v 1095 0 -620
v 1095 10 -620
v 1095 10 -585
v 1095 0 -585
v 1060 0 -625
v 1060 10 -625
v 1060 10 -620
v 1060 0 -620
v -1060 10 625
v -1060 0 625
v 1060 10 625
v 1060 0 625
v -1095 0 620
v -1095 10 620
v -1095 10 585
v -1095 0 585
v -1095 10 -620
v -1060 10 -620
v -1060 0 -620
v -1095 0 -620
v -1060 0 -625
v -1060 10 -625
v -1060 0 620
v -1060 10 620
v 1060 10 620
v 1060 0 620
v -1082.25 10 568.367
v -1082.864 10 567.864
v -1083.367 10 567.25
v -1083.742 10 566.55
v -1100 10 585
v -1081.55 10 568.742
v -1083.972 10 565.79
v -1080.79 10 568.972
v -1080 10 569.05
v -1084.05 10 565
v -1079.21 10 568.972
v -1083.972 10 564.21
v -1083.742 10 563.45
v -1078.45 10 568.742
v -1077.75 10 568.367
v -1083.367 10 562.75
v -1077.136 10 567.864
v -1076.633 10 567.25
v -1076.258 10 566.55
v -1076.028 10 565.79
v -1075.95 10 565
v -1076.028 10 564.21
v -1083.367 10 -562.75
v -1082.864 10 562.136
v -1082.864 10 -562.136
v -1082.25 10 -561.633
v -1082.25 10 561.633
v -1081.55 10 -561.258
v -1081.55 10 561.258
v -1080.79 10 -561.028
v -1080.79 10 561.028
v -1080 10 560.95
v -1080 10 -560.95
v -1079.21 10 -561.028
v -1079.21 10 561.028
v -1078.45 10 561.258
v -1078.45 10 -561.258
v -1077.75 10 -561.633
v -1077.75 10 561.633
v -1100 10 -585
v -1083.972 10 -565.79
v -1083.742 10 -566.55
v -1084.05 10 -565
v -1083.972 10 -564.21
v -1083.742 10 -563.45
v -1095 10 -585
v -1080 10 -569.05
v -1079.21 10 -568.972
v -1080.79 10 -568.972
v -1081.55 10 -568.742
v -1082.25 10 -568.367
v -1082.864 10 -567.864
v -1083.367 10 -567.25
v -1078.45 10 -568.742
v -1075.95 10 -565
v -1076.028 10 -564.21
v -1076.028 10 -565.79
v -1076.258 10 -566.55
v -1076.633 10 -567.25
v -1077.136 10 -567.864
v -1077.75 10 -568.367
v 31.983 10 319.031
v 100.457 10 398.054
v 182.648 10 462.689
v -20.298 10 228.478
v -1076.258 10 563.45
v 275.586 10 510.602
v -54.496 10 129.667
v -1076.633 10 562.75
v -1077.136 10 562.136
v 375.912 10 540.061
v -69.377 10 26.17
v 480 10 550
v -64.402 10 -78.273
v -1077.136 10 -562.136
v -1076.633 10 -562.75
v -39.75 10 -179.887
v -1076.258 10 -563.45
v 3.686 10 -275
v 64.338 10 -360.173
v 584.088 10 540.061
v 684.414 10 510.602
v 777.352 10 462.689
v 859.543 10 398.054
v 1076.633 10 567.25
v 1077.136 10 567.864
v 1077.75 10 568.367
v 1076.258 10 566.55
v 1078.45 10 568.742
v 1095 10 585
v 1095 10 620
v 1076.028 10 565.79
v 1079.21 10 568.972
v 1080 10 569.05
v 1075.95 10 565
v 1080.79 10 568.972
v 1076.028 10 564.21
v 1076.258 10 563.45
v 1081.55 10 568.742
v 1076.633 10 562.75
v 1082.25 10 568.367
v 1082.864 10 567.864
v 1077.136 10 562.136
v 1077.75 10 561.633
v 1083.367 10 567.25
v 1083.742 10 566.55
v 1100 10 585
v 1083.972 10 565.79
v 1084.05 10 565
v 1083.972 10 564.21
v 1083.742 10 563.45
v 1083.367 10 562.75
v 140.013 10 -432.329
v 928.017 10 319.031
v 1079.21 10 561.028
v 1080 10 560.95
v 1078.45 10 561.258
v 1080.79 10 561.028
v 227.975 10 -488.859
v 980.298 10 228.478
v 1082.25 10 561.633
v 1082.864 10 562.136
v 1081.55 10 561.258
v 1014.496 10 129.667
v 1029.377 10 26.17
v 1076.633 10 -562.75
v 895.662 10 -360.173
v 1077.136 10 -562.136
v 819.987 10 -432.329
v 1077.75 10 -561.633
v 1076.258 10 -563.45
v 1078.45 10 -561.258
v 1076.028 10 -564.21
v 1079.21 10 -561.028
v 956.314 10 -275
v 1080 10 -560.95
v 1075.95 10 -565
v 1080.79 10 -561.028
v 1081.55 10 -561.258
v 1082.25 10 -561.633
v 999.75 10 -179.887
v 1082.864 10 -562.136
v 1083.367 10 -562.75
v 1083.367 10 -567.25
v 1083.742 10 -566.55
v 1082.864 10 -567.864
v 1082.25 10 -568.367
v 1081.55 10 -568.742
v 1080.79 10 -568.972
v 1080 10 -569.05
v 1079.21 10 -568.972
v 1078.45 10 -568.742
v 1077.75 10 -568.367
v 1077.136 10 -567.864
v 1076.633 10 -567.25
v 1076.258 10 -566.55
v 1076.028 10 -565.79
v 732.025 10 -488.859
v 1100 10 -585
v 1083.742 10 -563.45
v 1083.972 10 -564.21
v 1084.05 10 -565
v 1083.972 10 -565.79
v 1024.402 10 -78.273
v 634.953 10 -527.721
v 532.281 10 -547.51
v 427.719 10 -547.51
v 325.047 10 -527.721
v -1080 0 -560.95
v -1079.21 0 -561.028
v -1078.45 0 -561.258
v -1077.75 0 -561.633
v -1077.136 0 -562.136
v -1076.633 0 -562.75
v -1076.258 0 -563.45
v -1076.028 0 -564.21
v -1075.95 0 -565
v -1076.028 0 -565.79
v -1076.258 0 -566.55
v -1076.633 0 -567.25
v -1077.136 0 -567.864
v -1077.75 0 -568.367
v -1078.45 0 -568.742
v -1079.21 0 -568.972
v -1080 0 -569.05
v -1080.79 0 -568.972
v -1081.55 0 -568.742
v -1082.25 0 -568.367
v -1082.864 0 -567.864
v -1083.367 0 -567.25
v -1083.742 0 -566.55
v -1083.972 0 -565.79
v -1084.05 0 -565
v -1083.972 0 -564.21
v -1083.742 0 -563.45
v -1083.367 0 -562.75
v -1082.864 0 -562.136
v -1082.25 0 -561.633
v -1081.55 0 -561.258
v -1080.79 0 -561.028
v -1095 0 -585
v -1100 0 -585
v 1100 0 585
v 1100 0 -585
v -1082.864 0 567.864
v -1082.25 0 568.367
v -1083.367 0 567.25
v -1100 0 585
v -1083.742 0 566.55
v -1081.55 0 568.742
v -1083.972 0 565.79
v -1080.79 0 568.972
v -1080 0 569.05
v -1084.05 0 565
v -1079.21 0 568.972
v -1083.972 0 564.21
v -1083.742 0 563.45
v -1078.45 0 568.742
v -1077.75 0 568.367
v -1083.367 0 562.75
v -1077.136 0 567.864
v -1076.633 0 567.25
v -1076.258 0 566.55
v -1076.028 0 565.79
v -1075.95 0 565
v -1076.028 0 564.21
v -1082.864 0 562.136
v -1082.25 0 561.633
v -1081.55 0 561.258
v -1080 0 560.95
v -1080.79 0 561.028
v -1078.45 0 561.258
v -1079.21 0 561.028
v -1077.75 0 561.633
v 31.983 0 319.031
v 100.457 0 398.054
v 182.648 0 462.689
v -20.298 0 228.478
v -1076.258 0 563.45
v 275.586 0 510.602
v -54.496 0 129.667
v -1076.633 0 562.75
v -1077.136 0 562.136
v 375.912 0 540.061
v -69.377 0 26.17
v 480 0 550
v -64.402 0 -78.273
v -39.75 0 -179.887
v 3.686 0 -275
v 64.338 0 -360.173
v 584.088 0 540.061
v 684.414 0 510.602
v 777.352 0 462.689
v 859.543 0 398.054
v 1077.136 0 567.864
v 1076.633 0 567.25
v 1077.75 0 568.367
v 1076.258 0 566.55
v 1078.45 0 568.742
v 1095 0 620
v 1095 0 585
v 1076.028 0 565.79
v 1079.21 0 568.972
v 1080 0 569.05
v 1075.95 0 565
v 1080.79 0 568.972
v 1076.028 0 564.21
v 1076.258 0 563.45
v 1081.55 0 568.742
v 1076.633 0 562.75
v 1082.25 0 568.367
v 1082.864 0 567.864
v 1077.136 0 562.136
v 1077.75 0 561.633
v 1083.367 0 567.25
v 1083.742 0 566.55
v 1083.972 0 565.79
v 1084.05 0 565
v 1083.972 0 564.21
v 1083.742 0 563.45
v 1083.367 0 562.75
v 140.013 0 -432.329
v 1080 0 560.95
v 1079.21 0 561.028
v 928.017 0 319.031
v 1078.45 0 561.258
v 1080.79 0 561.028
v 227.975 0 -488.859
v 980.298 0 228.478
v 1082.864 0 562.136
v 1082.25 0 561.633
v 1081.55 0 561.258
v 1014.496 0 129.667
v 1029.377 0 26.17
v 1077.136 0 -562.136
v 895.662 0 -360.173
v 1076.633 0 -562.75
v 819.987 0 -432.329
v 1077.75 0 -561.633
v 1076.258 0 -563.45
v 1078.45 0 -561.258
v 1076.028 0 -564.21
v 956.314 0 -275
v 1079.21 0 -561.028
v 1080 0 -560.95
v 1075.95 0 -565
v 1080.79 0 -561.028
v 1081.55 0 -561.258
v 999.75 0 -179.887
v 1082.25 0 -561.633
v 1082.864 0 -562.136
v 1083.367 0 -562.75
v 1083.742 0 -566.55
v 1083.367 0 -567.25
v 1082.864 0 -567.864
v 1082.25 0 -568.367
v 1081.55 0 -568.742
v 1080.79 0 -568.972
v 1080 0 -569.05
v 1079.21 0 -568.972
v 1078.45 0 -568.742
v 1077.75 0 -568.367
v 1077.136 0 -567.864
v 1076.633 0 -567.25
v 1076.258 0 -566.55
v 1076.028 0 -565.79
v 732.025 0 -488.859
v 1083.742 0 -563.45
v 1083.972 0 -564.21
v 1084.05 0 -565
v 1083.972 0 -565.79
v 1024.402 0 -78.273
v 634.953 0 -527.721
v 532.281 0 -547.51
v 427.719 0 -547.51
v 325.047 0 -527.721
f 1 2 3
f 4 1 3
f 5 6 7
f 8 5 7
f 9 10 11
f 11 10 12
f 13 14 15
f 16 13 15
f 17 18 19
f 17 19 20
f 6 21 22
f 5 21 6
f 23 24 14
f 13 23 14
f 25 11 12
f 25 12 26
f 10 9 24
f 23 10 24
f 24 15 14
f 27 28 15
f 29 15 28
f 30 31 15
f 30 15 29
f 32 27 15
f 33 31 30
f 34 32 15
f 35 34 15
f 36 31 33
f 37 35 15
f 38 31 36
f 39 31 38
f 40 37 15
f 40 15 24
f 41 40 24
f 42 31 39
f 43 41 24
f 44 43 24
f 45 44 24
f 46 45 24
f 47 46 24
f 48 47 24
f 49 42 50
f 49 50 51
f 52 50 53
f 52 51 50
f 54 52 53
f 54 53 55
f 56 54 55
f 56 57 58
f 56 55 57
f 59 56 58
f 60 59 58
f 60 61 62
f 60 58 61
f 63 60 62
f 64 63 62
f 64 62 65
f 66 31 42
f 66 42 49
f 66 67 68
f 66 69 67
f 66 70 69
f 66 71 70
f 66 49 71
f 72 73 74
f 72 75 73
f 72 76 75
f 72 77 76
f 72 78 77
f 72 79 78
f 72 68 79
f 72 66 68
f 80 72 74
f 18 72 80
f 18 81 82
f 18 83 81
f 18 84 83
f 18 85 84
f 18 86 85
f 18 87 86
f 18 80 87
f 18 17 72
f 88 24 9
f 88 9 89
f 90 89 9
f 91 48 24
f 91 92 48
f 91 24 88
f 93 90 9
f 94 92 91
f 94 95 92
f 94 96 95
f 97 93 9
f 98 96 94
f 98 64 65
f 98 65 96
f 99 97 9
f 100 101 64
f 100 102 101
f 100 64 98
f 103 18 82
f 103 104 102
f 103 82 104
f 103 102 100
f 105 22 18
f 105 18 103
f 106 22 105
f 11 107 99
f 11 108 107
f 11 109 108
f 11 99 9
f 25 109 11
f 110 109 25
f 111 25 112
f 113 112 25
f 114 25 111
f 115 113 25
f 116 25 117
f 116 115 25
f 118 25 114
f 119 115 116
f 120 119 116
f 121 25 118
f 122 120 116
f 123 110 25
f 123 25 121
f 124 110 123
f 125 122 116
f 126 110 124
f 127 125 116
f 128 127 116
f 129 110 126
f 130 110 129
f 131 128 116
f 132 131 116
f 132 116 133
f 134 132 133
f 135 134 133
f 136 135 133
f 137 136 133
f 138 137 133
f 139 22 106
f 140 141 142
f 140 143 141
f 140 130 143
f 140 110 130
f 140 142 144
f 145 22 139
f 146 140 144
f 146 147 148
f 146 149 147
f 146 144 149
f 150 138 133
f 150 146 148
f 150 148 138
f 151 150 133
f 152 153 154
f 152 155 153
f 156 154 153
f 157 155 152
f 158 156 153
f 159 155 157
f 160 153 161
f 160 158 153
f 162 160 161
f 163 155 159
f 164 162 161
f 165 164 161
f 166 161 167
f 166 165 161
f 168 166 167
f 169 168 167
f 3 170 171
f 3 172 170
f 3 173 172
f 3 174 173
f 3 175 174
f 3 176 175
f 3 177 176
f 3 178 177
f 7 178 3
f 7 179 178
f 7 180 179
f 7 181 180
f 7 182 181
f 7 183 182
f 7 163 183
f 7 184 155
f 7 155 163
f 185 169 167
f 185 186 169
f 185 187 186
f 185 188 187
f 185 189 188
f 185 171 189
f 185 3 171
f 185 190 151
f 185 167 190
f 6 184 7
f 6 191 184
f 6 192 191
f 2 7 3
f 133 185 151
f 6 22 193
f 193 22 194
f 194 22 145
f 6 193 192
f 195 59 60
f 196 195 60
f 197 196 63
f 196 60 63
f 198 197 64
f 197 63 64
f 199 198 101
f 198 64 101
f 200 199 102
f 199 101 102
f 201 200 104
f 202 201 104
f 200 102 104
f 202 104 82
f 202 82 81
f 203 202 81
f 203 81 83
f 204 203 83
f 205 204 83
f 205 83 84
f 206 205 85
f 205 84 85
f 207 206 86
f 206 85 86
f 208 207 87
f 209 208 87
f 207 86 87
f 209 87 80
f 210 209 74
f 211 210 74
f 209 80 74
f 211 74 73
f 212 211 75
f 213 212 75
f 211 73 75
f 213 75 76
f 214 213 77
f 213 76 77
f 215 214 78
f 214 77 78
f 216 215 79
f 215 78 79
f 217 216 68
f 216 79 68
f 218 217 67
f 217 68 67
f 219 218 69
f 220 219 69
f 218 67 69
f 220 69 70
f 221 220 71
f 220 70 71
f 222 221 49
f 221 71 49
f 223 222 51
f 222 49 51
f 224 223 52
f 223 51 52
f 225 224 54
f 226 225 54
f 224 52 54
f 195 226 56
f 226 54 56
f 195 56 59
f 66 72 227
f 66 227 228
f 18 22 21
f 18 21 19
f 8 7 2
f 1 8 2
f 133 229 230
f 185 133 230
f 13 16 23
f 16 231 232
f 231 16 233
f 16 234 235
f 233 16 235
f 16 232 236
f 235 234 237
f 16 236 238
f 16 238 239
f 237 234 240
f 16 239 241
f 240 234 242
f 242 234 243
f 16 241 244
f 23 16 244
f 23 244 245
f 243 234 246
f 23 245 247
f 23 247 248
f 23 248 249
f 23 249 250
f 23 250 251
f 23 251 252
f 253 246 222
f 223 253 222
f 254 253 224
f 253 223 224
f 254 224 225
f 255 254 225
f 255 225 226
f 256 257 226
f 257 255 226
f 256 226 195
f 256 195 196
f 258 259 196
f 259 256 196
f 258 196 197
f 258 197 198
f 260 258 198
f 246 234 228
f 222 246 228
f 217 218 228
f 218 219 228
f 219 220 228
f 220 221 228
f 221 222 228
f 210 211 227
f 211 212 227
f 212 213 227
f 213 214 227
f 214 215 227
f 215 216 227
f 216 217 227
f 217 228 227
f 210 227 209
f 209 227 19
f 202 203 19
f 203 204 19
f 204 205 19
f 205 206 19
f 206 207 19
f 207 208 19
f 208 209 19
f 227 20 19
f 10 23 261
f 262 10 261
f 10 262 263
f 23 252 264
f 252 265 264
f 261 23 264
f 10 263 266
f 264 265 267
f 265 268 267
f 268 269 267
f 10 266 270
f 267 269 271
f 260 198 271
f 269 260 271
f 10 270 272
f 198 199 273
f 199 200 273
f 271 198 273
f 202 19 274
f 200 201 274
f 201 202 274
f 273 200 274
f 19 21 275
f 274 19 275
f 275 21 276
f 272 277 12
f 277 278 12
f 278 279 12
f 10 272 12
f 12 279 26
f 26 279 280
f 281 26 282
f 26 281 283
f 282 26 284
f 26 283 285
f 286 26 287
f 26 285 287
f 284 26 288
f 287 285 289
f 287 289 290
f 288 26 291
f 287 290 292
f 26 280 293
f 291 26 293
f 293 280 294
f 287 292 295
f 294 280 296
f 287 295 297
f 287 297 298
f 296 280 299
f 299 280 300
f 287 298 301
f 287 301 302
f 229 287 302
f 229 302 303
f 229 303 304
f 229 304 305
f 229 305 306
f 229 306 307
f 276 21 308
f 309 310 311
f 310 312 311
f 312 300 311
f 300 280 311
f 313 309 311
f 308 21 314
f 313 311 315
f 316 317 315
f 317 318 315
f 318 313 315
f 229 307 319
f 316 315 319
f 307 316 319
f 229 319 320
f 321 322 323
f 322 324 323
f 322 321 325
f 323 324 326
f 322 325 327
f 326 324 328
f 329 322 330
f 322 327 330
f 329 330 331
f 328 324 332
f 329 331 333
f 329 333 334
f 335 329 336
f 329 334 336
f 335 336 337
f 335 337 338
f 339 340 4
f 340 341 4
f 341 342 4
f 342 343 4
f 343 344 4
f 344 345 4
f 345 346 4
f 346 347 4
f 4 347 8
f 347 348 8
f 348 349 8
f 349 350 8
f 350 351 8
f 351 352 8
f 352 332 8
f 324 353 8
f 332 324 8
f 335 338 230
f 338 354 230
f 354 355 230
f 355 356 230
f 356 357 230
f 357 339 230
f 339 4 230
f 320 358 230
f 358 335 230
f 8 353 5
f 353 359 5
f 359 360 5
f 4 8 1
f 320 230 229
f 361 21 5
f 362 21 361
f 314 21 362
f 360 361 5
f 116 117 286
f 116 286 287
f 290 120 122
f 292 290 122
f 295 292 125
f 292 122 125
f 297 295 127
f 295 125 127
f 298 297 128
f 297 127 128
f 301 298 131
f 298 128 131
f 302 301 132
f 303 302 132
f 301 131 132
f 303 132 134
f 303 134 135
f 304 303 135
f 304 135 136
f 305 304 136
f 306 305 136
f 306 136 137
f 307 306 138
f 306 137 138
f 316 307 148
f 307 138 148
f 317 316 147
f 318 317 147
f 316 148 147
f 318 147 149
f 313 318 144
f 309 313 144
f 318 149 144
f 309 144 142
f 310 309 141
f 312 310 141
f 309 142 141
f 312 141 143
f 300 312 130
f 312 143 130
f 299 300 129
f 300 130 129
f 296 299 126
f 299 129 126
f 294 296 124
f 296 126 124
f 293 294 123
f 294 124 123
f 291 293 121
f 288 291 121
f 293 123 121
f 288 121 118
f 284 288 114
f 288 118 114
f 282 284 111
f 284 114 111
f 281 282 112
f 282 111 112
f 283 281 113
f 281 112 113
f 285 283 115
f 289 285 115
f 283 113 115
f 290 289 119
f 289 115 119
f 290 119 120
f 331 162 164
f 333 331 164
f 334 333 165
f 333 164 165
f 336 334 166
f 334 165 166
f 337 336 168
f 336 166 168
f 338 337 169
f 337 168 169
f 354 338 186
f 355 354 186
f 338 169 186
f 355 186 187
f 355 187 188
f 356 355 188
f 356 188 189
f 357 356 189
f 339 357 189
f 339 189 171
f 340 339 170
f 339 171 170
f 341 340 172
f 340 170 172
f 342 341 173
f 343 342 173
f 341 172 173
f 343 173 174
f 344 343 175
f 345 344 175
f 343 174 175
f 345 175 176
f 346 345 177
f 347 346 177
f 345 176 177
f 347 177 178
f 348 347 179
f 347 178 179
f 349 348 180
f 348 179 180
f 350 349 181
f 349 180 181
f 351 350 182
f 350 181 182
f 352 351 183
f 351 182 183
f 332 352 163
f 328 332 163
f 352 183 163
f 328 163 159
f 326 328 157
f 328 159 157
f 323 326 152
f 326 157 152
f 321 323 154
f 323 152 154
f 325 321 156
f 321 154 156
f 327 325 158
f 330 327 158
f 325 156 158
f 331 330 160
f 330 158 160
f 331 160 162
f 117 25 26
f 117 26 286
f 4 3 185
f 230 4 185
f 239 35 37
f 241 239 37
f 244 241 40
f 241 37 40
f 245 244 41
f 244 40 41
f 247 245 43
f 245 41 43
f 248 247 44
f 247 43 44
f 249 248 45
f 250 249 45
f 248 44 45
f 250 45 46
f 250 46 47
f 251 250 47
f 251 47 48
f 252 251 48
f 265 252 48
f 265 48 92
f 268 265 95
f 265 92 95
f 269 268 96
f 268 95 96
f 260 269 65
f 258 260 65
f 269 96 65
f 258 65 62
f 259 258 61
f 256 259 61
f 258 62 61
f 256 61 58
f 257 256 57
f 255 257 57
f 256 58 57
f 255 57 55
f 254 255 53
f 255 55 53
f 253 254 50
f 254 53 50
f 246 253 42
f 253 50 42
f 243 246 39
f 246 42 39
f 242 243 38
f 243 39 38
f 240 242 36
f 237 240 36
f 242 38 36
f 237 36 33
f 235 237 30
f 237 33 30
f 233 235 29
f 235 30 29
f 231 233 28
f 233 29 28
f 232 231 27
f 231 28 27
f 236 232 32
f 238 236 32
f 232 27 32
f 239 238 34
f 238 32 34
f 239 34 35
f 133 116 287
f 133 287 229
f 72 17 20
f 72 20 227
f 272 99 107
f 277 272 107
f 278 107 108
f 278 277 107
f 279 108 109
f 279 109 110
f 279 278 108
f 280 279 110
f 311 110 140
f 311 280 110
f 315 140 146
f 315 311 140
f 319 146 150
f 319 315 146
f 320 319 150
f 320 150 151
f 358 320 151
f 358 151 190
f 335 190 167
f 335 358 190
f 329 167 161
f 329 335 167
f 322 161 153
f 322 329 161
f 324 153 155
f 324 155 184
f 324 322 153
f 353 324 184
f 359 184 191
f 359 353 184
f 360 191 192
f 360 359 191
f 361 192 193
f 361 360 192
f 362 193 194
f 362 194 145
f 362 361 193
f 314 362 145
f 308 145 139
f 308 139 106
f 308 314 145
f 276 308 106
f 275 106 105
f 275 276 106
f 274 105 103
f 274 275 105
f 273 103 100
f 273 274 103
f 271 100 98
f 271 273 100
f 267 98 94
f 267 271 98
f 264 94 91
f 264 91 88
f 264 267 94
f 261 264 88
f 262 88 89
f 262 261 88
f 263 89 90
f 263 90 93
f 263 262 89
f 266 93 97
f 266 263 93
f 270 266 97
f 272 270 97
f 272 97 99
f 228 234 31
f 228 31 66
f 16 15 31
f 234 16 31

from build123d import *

# Parameters (mm, degrees)
SKETCH_1_W          = 2200
SKETCH_1_H          = 1250
SKETCH_1_R          = 550
EXTRUDE_1_DEPTH     = 10
SKETCH_2_R          = 4.05
CUT_EXTRUDE_1_DEPTH = 10
CUT_EXTRUDE_2_DEPTH = 10


with BuildPart() as part:
    # 草图1 → 凸台-拉伸1 (new body)
    with BuildSketch(Plane(origin=(0, 0, 0), x_dir=(1, 0, 0), z_dir=(0, 1, 0))):
        Rectangle(SKETCH_1_W, SKETCH_1_H)
        with Locations(Location((480, 0, 0), (0, 0, 270))):
            Circle(SKETCH_1_R, mode=Mode.SUBTRACT)
    extrude(amount=EXTRUDE_1_DEPTH)

    # 草图2 → 切除-拉伸1 (cut)
    with BuildSketch(Plane(origin=(0, 10, 0), x_dir=(1, 0, 0), z_dir=(0, 1, 0))):
        with Locations(Location((-1080, 565, 0), (0, 0, 270))):
            Circle(SKETCH_2_R)
        with Locations(Location((-1080, -565, 0), (0, 0, 270))):
            Circle(SKETCH_2_R)
        with Locations(Location((1080, -565, 0), (0, 0, 270))):
            Circle(SKETCH_2_R)
        with Locations(Location((1080, 565, 0), (0, 0, 270))):
            Circle(SKETCH_2_R)
    extrude(amount=-CUT_EXTRUDE_1_DEPTH, mode=Mode.SUBTRACT)

    # 草图3 → 切除-拉伸2 (cut)
    with BuildSketch(Plane(origin=(0, 10, 0), x_dir=(1, 0, 0), z_dir=(0, 1, 0))):
        Polygon((-1100, 625), (-1060, 625), (-1060, 620), (-1095, 620), (-1095, 585), (-1100, 585), align=None)
        Polygon((-1100, -585), (-1100, -625), (-1060, -625), (-1060, -620), (-1095, -620), (-1095, -585), align=None)
        Polygon((1100, -625), (1060, -625), (1060, -620), (1095, -620), (1095, -585), (1100, -585), align=None)
        Polygon((1100, 585), (1100, 625), (1060, 625), (1060, 620), (1095, 620), (1095, 585), align=None)
    extrude(amount=-CUT_EXTRUDE_2_DEPTH, mode=Mode.SUBTRACT)


solid = part.part
